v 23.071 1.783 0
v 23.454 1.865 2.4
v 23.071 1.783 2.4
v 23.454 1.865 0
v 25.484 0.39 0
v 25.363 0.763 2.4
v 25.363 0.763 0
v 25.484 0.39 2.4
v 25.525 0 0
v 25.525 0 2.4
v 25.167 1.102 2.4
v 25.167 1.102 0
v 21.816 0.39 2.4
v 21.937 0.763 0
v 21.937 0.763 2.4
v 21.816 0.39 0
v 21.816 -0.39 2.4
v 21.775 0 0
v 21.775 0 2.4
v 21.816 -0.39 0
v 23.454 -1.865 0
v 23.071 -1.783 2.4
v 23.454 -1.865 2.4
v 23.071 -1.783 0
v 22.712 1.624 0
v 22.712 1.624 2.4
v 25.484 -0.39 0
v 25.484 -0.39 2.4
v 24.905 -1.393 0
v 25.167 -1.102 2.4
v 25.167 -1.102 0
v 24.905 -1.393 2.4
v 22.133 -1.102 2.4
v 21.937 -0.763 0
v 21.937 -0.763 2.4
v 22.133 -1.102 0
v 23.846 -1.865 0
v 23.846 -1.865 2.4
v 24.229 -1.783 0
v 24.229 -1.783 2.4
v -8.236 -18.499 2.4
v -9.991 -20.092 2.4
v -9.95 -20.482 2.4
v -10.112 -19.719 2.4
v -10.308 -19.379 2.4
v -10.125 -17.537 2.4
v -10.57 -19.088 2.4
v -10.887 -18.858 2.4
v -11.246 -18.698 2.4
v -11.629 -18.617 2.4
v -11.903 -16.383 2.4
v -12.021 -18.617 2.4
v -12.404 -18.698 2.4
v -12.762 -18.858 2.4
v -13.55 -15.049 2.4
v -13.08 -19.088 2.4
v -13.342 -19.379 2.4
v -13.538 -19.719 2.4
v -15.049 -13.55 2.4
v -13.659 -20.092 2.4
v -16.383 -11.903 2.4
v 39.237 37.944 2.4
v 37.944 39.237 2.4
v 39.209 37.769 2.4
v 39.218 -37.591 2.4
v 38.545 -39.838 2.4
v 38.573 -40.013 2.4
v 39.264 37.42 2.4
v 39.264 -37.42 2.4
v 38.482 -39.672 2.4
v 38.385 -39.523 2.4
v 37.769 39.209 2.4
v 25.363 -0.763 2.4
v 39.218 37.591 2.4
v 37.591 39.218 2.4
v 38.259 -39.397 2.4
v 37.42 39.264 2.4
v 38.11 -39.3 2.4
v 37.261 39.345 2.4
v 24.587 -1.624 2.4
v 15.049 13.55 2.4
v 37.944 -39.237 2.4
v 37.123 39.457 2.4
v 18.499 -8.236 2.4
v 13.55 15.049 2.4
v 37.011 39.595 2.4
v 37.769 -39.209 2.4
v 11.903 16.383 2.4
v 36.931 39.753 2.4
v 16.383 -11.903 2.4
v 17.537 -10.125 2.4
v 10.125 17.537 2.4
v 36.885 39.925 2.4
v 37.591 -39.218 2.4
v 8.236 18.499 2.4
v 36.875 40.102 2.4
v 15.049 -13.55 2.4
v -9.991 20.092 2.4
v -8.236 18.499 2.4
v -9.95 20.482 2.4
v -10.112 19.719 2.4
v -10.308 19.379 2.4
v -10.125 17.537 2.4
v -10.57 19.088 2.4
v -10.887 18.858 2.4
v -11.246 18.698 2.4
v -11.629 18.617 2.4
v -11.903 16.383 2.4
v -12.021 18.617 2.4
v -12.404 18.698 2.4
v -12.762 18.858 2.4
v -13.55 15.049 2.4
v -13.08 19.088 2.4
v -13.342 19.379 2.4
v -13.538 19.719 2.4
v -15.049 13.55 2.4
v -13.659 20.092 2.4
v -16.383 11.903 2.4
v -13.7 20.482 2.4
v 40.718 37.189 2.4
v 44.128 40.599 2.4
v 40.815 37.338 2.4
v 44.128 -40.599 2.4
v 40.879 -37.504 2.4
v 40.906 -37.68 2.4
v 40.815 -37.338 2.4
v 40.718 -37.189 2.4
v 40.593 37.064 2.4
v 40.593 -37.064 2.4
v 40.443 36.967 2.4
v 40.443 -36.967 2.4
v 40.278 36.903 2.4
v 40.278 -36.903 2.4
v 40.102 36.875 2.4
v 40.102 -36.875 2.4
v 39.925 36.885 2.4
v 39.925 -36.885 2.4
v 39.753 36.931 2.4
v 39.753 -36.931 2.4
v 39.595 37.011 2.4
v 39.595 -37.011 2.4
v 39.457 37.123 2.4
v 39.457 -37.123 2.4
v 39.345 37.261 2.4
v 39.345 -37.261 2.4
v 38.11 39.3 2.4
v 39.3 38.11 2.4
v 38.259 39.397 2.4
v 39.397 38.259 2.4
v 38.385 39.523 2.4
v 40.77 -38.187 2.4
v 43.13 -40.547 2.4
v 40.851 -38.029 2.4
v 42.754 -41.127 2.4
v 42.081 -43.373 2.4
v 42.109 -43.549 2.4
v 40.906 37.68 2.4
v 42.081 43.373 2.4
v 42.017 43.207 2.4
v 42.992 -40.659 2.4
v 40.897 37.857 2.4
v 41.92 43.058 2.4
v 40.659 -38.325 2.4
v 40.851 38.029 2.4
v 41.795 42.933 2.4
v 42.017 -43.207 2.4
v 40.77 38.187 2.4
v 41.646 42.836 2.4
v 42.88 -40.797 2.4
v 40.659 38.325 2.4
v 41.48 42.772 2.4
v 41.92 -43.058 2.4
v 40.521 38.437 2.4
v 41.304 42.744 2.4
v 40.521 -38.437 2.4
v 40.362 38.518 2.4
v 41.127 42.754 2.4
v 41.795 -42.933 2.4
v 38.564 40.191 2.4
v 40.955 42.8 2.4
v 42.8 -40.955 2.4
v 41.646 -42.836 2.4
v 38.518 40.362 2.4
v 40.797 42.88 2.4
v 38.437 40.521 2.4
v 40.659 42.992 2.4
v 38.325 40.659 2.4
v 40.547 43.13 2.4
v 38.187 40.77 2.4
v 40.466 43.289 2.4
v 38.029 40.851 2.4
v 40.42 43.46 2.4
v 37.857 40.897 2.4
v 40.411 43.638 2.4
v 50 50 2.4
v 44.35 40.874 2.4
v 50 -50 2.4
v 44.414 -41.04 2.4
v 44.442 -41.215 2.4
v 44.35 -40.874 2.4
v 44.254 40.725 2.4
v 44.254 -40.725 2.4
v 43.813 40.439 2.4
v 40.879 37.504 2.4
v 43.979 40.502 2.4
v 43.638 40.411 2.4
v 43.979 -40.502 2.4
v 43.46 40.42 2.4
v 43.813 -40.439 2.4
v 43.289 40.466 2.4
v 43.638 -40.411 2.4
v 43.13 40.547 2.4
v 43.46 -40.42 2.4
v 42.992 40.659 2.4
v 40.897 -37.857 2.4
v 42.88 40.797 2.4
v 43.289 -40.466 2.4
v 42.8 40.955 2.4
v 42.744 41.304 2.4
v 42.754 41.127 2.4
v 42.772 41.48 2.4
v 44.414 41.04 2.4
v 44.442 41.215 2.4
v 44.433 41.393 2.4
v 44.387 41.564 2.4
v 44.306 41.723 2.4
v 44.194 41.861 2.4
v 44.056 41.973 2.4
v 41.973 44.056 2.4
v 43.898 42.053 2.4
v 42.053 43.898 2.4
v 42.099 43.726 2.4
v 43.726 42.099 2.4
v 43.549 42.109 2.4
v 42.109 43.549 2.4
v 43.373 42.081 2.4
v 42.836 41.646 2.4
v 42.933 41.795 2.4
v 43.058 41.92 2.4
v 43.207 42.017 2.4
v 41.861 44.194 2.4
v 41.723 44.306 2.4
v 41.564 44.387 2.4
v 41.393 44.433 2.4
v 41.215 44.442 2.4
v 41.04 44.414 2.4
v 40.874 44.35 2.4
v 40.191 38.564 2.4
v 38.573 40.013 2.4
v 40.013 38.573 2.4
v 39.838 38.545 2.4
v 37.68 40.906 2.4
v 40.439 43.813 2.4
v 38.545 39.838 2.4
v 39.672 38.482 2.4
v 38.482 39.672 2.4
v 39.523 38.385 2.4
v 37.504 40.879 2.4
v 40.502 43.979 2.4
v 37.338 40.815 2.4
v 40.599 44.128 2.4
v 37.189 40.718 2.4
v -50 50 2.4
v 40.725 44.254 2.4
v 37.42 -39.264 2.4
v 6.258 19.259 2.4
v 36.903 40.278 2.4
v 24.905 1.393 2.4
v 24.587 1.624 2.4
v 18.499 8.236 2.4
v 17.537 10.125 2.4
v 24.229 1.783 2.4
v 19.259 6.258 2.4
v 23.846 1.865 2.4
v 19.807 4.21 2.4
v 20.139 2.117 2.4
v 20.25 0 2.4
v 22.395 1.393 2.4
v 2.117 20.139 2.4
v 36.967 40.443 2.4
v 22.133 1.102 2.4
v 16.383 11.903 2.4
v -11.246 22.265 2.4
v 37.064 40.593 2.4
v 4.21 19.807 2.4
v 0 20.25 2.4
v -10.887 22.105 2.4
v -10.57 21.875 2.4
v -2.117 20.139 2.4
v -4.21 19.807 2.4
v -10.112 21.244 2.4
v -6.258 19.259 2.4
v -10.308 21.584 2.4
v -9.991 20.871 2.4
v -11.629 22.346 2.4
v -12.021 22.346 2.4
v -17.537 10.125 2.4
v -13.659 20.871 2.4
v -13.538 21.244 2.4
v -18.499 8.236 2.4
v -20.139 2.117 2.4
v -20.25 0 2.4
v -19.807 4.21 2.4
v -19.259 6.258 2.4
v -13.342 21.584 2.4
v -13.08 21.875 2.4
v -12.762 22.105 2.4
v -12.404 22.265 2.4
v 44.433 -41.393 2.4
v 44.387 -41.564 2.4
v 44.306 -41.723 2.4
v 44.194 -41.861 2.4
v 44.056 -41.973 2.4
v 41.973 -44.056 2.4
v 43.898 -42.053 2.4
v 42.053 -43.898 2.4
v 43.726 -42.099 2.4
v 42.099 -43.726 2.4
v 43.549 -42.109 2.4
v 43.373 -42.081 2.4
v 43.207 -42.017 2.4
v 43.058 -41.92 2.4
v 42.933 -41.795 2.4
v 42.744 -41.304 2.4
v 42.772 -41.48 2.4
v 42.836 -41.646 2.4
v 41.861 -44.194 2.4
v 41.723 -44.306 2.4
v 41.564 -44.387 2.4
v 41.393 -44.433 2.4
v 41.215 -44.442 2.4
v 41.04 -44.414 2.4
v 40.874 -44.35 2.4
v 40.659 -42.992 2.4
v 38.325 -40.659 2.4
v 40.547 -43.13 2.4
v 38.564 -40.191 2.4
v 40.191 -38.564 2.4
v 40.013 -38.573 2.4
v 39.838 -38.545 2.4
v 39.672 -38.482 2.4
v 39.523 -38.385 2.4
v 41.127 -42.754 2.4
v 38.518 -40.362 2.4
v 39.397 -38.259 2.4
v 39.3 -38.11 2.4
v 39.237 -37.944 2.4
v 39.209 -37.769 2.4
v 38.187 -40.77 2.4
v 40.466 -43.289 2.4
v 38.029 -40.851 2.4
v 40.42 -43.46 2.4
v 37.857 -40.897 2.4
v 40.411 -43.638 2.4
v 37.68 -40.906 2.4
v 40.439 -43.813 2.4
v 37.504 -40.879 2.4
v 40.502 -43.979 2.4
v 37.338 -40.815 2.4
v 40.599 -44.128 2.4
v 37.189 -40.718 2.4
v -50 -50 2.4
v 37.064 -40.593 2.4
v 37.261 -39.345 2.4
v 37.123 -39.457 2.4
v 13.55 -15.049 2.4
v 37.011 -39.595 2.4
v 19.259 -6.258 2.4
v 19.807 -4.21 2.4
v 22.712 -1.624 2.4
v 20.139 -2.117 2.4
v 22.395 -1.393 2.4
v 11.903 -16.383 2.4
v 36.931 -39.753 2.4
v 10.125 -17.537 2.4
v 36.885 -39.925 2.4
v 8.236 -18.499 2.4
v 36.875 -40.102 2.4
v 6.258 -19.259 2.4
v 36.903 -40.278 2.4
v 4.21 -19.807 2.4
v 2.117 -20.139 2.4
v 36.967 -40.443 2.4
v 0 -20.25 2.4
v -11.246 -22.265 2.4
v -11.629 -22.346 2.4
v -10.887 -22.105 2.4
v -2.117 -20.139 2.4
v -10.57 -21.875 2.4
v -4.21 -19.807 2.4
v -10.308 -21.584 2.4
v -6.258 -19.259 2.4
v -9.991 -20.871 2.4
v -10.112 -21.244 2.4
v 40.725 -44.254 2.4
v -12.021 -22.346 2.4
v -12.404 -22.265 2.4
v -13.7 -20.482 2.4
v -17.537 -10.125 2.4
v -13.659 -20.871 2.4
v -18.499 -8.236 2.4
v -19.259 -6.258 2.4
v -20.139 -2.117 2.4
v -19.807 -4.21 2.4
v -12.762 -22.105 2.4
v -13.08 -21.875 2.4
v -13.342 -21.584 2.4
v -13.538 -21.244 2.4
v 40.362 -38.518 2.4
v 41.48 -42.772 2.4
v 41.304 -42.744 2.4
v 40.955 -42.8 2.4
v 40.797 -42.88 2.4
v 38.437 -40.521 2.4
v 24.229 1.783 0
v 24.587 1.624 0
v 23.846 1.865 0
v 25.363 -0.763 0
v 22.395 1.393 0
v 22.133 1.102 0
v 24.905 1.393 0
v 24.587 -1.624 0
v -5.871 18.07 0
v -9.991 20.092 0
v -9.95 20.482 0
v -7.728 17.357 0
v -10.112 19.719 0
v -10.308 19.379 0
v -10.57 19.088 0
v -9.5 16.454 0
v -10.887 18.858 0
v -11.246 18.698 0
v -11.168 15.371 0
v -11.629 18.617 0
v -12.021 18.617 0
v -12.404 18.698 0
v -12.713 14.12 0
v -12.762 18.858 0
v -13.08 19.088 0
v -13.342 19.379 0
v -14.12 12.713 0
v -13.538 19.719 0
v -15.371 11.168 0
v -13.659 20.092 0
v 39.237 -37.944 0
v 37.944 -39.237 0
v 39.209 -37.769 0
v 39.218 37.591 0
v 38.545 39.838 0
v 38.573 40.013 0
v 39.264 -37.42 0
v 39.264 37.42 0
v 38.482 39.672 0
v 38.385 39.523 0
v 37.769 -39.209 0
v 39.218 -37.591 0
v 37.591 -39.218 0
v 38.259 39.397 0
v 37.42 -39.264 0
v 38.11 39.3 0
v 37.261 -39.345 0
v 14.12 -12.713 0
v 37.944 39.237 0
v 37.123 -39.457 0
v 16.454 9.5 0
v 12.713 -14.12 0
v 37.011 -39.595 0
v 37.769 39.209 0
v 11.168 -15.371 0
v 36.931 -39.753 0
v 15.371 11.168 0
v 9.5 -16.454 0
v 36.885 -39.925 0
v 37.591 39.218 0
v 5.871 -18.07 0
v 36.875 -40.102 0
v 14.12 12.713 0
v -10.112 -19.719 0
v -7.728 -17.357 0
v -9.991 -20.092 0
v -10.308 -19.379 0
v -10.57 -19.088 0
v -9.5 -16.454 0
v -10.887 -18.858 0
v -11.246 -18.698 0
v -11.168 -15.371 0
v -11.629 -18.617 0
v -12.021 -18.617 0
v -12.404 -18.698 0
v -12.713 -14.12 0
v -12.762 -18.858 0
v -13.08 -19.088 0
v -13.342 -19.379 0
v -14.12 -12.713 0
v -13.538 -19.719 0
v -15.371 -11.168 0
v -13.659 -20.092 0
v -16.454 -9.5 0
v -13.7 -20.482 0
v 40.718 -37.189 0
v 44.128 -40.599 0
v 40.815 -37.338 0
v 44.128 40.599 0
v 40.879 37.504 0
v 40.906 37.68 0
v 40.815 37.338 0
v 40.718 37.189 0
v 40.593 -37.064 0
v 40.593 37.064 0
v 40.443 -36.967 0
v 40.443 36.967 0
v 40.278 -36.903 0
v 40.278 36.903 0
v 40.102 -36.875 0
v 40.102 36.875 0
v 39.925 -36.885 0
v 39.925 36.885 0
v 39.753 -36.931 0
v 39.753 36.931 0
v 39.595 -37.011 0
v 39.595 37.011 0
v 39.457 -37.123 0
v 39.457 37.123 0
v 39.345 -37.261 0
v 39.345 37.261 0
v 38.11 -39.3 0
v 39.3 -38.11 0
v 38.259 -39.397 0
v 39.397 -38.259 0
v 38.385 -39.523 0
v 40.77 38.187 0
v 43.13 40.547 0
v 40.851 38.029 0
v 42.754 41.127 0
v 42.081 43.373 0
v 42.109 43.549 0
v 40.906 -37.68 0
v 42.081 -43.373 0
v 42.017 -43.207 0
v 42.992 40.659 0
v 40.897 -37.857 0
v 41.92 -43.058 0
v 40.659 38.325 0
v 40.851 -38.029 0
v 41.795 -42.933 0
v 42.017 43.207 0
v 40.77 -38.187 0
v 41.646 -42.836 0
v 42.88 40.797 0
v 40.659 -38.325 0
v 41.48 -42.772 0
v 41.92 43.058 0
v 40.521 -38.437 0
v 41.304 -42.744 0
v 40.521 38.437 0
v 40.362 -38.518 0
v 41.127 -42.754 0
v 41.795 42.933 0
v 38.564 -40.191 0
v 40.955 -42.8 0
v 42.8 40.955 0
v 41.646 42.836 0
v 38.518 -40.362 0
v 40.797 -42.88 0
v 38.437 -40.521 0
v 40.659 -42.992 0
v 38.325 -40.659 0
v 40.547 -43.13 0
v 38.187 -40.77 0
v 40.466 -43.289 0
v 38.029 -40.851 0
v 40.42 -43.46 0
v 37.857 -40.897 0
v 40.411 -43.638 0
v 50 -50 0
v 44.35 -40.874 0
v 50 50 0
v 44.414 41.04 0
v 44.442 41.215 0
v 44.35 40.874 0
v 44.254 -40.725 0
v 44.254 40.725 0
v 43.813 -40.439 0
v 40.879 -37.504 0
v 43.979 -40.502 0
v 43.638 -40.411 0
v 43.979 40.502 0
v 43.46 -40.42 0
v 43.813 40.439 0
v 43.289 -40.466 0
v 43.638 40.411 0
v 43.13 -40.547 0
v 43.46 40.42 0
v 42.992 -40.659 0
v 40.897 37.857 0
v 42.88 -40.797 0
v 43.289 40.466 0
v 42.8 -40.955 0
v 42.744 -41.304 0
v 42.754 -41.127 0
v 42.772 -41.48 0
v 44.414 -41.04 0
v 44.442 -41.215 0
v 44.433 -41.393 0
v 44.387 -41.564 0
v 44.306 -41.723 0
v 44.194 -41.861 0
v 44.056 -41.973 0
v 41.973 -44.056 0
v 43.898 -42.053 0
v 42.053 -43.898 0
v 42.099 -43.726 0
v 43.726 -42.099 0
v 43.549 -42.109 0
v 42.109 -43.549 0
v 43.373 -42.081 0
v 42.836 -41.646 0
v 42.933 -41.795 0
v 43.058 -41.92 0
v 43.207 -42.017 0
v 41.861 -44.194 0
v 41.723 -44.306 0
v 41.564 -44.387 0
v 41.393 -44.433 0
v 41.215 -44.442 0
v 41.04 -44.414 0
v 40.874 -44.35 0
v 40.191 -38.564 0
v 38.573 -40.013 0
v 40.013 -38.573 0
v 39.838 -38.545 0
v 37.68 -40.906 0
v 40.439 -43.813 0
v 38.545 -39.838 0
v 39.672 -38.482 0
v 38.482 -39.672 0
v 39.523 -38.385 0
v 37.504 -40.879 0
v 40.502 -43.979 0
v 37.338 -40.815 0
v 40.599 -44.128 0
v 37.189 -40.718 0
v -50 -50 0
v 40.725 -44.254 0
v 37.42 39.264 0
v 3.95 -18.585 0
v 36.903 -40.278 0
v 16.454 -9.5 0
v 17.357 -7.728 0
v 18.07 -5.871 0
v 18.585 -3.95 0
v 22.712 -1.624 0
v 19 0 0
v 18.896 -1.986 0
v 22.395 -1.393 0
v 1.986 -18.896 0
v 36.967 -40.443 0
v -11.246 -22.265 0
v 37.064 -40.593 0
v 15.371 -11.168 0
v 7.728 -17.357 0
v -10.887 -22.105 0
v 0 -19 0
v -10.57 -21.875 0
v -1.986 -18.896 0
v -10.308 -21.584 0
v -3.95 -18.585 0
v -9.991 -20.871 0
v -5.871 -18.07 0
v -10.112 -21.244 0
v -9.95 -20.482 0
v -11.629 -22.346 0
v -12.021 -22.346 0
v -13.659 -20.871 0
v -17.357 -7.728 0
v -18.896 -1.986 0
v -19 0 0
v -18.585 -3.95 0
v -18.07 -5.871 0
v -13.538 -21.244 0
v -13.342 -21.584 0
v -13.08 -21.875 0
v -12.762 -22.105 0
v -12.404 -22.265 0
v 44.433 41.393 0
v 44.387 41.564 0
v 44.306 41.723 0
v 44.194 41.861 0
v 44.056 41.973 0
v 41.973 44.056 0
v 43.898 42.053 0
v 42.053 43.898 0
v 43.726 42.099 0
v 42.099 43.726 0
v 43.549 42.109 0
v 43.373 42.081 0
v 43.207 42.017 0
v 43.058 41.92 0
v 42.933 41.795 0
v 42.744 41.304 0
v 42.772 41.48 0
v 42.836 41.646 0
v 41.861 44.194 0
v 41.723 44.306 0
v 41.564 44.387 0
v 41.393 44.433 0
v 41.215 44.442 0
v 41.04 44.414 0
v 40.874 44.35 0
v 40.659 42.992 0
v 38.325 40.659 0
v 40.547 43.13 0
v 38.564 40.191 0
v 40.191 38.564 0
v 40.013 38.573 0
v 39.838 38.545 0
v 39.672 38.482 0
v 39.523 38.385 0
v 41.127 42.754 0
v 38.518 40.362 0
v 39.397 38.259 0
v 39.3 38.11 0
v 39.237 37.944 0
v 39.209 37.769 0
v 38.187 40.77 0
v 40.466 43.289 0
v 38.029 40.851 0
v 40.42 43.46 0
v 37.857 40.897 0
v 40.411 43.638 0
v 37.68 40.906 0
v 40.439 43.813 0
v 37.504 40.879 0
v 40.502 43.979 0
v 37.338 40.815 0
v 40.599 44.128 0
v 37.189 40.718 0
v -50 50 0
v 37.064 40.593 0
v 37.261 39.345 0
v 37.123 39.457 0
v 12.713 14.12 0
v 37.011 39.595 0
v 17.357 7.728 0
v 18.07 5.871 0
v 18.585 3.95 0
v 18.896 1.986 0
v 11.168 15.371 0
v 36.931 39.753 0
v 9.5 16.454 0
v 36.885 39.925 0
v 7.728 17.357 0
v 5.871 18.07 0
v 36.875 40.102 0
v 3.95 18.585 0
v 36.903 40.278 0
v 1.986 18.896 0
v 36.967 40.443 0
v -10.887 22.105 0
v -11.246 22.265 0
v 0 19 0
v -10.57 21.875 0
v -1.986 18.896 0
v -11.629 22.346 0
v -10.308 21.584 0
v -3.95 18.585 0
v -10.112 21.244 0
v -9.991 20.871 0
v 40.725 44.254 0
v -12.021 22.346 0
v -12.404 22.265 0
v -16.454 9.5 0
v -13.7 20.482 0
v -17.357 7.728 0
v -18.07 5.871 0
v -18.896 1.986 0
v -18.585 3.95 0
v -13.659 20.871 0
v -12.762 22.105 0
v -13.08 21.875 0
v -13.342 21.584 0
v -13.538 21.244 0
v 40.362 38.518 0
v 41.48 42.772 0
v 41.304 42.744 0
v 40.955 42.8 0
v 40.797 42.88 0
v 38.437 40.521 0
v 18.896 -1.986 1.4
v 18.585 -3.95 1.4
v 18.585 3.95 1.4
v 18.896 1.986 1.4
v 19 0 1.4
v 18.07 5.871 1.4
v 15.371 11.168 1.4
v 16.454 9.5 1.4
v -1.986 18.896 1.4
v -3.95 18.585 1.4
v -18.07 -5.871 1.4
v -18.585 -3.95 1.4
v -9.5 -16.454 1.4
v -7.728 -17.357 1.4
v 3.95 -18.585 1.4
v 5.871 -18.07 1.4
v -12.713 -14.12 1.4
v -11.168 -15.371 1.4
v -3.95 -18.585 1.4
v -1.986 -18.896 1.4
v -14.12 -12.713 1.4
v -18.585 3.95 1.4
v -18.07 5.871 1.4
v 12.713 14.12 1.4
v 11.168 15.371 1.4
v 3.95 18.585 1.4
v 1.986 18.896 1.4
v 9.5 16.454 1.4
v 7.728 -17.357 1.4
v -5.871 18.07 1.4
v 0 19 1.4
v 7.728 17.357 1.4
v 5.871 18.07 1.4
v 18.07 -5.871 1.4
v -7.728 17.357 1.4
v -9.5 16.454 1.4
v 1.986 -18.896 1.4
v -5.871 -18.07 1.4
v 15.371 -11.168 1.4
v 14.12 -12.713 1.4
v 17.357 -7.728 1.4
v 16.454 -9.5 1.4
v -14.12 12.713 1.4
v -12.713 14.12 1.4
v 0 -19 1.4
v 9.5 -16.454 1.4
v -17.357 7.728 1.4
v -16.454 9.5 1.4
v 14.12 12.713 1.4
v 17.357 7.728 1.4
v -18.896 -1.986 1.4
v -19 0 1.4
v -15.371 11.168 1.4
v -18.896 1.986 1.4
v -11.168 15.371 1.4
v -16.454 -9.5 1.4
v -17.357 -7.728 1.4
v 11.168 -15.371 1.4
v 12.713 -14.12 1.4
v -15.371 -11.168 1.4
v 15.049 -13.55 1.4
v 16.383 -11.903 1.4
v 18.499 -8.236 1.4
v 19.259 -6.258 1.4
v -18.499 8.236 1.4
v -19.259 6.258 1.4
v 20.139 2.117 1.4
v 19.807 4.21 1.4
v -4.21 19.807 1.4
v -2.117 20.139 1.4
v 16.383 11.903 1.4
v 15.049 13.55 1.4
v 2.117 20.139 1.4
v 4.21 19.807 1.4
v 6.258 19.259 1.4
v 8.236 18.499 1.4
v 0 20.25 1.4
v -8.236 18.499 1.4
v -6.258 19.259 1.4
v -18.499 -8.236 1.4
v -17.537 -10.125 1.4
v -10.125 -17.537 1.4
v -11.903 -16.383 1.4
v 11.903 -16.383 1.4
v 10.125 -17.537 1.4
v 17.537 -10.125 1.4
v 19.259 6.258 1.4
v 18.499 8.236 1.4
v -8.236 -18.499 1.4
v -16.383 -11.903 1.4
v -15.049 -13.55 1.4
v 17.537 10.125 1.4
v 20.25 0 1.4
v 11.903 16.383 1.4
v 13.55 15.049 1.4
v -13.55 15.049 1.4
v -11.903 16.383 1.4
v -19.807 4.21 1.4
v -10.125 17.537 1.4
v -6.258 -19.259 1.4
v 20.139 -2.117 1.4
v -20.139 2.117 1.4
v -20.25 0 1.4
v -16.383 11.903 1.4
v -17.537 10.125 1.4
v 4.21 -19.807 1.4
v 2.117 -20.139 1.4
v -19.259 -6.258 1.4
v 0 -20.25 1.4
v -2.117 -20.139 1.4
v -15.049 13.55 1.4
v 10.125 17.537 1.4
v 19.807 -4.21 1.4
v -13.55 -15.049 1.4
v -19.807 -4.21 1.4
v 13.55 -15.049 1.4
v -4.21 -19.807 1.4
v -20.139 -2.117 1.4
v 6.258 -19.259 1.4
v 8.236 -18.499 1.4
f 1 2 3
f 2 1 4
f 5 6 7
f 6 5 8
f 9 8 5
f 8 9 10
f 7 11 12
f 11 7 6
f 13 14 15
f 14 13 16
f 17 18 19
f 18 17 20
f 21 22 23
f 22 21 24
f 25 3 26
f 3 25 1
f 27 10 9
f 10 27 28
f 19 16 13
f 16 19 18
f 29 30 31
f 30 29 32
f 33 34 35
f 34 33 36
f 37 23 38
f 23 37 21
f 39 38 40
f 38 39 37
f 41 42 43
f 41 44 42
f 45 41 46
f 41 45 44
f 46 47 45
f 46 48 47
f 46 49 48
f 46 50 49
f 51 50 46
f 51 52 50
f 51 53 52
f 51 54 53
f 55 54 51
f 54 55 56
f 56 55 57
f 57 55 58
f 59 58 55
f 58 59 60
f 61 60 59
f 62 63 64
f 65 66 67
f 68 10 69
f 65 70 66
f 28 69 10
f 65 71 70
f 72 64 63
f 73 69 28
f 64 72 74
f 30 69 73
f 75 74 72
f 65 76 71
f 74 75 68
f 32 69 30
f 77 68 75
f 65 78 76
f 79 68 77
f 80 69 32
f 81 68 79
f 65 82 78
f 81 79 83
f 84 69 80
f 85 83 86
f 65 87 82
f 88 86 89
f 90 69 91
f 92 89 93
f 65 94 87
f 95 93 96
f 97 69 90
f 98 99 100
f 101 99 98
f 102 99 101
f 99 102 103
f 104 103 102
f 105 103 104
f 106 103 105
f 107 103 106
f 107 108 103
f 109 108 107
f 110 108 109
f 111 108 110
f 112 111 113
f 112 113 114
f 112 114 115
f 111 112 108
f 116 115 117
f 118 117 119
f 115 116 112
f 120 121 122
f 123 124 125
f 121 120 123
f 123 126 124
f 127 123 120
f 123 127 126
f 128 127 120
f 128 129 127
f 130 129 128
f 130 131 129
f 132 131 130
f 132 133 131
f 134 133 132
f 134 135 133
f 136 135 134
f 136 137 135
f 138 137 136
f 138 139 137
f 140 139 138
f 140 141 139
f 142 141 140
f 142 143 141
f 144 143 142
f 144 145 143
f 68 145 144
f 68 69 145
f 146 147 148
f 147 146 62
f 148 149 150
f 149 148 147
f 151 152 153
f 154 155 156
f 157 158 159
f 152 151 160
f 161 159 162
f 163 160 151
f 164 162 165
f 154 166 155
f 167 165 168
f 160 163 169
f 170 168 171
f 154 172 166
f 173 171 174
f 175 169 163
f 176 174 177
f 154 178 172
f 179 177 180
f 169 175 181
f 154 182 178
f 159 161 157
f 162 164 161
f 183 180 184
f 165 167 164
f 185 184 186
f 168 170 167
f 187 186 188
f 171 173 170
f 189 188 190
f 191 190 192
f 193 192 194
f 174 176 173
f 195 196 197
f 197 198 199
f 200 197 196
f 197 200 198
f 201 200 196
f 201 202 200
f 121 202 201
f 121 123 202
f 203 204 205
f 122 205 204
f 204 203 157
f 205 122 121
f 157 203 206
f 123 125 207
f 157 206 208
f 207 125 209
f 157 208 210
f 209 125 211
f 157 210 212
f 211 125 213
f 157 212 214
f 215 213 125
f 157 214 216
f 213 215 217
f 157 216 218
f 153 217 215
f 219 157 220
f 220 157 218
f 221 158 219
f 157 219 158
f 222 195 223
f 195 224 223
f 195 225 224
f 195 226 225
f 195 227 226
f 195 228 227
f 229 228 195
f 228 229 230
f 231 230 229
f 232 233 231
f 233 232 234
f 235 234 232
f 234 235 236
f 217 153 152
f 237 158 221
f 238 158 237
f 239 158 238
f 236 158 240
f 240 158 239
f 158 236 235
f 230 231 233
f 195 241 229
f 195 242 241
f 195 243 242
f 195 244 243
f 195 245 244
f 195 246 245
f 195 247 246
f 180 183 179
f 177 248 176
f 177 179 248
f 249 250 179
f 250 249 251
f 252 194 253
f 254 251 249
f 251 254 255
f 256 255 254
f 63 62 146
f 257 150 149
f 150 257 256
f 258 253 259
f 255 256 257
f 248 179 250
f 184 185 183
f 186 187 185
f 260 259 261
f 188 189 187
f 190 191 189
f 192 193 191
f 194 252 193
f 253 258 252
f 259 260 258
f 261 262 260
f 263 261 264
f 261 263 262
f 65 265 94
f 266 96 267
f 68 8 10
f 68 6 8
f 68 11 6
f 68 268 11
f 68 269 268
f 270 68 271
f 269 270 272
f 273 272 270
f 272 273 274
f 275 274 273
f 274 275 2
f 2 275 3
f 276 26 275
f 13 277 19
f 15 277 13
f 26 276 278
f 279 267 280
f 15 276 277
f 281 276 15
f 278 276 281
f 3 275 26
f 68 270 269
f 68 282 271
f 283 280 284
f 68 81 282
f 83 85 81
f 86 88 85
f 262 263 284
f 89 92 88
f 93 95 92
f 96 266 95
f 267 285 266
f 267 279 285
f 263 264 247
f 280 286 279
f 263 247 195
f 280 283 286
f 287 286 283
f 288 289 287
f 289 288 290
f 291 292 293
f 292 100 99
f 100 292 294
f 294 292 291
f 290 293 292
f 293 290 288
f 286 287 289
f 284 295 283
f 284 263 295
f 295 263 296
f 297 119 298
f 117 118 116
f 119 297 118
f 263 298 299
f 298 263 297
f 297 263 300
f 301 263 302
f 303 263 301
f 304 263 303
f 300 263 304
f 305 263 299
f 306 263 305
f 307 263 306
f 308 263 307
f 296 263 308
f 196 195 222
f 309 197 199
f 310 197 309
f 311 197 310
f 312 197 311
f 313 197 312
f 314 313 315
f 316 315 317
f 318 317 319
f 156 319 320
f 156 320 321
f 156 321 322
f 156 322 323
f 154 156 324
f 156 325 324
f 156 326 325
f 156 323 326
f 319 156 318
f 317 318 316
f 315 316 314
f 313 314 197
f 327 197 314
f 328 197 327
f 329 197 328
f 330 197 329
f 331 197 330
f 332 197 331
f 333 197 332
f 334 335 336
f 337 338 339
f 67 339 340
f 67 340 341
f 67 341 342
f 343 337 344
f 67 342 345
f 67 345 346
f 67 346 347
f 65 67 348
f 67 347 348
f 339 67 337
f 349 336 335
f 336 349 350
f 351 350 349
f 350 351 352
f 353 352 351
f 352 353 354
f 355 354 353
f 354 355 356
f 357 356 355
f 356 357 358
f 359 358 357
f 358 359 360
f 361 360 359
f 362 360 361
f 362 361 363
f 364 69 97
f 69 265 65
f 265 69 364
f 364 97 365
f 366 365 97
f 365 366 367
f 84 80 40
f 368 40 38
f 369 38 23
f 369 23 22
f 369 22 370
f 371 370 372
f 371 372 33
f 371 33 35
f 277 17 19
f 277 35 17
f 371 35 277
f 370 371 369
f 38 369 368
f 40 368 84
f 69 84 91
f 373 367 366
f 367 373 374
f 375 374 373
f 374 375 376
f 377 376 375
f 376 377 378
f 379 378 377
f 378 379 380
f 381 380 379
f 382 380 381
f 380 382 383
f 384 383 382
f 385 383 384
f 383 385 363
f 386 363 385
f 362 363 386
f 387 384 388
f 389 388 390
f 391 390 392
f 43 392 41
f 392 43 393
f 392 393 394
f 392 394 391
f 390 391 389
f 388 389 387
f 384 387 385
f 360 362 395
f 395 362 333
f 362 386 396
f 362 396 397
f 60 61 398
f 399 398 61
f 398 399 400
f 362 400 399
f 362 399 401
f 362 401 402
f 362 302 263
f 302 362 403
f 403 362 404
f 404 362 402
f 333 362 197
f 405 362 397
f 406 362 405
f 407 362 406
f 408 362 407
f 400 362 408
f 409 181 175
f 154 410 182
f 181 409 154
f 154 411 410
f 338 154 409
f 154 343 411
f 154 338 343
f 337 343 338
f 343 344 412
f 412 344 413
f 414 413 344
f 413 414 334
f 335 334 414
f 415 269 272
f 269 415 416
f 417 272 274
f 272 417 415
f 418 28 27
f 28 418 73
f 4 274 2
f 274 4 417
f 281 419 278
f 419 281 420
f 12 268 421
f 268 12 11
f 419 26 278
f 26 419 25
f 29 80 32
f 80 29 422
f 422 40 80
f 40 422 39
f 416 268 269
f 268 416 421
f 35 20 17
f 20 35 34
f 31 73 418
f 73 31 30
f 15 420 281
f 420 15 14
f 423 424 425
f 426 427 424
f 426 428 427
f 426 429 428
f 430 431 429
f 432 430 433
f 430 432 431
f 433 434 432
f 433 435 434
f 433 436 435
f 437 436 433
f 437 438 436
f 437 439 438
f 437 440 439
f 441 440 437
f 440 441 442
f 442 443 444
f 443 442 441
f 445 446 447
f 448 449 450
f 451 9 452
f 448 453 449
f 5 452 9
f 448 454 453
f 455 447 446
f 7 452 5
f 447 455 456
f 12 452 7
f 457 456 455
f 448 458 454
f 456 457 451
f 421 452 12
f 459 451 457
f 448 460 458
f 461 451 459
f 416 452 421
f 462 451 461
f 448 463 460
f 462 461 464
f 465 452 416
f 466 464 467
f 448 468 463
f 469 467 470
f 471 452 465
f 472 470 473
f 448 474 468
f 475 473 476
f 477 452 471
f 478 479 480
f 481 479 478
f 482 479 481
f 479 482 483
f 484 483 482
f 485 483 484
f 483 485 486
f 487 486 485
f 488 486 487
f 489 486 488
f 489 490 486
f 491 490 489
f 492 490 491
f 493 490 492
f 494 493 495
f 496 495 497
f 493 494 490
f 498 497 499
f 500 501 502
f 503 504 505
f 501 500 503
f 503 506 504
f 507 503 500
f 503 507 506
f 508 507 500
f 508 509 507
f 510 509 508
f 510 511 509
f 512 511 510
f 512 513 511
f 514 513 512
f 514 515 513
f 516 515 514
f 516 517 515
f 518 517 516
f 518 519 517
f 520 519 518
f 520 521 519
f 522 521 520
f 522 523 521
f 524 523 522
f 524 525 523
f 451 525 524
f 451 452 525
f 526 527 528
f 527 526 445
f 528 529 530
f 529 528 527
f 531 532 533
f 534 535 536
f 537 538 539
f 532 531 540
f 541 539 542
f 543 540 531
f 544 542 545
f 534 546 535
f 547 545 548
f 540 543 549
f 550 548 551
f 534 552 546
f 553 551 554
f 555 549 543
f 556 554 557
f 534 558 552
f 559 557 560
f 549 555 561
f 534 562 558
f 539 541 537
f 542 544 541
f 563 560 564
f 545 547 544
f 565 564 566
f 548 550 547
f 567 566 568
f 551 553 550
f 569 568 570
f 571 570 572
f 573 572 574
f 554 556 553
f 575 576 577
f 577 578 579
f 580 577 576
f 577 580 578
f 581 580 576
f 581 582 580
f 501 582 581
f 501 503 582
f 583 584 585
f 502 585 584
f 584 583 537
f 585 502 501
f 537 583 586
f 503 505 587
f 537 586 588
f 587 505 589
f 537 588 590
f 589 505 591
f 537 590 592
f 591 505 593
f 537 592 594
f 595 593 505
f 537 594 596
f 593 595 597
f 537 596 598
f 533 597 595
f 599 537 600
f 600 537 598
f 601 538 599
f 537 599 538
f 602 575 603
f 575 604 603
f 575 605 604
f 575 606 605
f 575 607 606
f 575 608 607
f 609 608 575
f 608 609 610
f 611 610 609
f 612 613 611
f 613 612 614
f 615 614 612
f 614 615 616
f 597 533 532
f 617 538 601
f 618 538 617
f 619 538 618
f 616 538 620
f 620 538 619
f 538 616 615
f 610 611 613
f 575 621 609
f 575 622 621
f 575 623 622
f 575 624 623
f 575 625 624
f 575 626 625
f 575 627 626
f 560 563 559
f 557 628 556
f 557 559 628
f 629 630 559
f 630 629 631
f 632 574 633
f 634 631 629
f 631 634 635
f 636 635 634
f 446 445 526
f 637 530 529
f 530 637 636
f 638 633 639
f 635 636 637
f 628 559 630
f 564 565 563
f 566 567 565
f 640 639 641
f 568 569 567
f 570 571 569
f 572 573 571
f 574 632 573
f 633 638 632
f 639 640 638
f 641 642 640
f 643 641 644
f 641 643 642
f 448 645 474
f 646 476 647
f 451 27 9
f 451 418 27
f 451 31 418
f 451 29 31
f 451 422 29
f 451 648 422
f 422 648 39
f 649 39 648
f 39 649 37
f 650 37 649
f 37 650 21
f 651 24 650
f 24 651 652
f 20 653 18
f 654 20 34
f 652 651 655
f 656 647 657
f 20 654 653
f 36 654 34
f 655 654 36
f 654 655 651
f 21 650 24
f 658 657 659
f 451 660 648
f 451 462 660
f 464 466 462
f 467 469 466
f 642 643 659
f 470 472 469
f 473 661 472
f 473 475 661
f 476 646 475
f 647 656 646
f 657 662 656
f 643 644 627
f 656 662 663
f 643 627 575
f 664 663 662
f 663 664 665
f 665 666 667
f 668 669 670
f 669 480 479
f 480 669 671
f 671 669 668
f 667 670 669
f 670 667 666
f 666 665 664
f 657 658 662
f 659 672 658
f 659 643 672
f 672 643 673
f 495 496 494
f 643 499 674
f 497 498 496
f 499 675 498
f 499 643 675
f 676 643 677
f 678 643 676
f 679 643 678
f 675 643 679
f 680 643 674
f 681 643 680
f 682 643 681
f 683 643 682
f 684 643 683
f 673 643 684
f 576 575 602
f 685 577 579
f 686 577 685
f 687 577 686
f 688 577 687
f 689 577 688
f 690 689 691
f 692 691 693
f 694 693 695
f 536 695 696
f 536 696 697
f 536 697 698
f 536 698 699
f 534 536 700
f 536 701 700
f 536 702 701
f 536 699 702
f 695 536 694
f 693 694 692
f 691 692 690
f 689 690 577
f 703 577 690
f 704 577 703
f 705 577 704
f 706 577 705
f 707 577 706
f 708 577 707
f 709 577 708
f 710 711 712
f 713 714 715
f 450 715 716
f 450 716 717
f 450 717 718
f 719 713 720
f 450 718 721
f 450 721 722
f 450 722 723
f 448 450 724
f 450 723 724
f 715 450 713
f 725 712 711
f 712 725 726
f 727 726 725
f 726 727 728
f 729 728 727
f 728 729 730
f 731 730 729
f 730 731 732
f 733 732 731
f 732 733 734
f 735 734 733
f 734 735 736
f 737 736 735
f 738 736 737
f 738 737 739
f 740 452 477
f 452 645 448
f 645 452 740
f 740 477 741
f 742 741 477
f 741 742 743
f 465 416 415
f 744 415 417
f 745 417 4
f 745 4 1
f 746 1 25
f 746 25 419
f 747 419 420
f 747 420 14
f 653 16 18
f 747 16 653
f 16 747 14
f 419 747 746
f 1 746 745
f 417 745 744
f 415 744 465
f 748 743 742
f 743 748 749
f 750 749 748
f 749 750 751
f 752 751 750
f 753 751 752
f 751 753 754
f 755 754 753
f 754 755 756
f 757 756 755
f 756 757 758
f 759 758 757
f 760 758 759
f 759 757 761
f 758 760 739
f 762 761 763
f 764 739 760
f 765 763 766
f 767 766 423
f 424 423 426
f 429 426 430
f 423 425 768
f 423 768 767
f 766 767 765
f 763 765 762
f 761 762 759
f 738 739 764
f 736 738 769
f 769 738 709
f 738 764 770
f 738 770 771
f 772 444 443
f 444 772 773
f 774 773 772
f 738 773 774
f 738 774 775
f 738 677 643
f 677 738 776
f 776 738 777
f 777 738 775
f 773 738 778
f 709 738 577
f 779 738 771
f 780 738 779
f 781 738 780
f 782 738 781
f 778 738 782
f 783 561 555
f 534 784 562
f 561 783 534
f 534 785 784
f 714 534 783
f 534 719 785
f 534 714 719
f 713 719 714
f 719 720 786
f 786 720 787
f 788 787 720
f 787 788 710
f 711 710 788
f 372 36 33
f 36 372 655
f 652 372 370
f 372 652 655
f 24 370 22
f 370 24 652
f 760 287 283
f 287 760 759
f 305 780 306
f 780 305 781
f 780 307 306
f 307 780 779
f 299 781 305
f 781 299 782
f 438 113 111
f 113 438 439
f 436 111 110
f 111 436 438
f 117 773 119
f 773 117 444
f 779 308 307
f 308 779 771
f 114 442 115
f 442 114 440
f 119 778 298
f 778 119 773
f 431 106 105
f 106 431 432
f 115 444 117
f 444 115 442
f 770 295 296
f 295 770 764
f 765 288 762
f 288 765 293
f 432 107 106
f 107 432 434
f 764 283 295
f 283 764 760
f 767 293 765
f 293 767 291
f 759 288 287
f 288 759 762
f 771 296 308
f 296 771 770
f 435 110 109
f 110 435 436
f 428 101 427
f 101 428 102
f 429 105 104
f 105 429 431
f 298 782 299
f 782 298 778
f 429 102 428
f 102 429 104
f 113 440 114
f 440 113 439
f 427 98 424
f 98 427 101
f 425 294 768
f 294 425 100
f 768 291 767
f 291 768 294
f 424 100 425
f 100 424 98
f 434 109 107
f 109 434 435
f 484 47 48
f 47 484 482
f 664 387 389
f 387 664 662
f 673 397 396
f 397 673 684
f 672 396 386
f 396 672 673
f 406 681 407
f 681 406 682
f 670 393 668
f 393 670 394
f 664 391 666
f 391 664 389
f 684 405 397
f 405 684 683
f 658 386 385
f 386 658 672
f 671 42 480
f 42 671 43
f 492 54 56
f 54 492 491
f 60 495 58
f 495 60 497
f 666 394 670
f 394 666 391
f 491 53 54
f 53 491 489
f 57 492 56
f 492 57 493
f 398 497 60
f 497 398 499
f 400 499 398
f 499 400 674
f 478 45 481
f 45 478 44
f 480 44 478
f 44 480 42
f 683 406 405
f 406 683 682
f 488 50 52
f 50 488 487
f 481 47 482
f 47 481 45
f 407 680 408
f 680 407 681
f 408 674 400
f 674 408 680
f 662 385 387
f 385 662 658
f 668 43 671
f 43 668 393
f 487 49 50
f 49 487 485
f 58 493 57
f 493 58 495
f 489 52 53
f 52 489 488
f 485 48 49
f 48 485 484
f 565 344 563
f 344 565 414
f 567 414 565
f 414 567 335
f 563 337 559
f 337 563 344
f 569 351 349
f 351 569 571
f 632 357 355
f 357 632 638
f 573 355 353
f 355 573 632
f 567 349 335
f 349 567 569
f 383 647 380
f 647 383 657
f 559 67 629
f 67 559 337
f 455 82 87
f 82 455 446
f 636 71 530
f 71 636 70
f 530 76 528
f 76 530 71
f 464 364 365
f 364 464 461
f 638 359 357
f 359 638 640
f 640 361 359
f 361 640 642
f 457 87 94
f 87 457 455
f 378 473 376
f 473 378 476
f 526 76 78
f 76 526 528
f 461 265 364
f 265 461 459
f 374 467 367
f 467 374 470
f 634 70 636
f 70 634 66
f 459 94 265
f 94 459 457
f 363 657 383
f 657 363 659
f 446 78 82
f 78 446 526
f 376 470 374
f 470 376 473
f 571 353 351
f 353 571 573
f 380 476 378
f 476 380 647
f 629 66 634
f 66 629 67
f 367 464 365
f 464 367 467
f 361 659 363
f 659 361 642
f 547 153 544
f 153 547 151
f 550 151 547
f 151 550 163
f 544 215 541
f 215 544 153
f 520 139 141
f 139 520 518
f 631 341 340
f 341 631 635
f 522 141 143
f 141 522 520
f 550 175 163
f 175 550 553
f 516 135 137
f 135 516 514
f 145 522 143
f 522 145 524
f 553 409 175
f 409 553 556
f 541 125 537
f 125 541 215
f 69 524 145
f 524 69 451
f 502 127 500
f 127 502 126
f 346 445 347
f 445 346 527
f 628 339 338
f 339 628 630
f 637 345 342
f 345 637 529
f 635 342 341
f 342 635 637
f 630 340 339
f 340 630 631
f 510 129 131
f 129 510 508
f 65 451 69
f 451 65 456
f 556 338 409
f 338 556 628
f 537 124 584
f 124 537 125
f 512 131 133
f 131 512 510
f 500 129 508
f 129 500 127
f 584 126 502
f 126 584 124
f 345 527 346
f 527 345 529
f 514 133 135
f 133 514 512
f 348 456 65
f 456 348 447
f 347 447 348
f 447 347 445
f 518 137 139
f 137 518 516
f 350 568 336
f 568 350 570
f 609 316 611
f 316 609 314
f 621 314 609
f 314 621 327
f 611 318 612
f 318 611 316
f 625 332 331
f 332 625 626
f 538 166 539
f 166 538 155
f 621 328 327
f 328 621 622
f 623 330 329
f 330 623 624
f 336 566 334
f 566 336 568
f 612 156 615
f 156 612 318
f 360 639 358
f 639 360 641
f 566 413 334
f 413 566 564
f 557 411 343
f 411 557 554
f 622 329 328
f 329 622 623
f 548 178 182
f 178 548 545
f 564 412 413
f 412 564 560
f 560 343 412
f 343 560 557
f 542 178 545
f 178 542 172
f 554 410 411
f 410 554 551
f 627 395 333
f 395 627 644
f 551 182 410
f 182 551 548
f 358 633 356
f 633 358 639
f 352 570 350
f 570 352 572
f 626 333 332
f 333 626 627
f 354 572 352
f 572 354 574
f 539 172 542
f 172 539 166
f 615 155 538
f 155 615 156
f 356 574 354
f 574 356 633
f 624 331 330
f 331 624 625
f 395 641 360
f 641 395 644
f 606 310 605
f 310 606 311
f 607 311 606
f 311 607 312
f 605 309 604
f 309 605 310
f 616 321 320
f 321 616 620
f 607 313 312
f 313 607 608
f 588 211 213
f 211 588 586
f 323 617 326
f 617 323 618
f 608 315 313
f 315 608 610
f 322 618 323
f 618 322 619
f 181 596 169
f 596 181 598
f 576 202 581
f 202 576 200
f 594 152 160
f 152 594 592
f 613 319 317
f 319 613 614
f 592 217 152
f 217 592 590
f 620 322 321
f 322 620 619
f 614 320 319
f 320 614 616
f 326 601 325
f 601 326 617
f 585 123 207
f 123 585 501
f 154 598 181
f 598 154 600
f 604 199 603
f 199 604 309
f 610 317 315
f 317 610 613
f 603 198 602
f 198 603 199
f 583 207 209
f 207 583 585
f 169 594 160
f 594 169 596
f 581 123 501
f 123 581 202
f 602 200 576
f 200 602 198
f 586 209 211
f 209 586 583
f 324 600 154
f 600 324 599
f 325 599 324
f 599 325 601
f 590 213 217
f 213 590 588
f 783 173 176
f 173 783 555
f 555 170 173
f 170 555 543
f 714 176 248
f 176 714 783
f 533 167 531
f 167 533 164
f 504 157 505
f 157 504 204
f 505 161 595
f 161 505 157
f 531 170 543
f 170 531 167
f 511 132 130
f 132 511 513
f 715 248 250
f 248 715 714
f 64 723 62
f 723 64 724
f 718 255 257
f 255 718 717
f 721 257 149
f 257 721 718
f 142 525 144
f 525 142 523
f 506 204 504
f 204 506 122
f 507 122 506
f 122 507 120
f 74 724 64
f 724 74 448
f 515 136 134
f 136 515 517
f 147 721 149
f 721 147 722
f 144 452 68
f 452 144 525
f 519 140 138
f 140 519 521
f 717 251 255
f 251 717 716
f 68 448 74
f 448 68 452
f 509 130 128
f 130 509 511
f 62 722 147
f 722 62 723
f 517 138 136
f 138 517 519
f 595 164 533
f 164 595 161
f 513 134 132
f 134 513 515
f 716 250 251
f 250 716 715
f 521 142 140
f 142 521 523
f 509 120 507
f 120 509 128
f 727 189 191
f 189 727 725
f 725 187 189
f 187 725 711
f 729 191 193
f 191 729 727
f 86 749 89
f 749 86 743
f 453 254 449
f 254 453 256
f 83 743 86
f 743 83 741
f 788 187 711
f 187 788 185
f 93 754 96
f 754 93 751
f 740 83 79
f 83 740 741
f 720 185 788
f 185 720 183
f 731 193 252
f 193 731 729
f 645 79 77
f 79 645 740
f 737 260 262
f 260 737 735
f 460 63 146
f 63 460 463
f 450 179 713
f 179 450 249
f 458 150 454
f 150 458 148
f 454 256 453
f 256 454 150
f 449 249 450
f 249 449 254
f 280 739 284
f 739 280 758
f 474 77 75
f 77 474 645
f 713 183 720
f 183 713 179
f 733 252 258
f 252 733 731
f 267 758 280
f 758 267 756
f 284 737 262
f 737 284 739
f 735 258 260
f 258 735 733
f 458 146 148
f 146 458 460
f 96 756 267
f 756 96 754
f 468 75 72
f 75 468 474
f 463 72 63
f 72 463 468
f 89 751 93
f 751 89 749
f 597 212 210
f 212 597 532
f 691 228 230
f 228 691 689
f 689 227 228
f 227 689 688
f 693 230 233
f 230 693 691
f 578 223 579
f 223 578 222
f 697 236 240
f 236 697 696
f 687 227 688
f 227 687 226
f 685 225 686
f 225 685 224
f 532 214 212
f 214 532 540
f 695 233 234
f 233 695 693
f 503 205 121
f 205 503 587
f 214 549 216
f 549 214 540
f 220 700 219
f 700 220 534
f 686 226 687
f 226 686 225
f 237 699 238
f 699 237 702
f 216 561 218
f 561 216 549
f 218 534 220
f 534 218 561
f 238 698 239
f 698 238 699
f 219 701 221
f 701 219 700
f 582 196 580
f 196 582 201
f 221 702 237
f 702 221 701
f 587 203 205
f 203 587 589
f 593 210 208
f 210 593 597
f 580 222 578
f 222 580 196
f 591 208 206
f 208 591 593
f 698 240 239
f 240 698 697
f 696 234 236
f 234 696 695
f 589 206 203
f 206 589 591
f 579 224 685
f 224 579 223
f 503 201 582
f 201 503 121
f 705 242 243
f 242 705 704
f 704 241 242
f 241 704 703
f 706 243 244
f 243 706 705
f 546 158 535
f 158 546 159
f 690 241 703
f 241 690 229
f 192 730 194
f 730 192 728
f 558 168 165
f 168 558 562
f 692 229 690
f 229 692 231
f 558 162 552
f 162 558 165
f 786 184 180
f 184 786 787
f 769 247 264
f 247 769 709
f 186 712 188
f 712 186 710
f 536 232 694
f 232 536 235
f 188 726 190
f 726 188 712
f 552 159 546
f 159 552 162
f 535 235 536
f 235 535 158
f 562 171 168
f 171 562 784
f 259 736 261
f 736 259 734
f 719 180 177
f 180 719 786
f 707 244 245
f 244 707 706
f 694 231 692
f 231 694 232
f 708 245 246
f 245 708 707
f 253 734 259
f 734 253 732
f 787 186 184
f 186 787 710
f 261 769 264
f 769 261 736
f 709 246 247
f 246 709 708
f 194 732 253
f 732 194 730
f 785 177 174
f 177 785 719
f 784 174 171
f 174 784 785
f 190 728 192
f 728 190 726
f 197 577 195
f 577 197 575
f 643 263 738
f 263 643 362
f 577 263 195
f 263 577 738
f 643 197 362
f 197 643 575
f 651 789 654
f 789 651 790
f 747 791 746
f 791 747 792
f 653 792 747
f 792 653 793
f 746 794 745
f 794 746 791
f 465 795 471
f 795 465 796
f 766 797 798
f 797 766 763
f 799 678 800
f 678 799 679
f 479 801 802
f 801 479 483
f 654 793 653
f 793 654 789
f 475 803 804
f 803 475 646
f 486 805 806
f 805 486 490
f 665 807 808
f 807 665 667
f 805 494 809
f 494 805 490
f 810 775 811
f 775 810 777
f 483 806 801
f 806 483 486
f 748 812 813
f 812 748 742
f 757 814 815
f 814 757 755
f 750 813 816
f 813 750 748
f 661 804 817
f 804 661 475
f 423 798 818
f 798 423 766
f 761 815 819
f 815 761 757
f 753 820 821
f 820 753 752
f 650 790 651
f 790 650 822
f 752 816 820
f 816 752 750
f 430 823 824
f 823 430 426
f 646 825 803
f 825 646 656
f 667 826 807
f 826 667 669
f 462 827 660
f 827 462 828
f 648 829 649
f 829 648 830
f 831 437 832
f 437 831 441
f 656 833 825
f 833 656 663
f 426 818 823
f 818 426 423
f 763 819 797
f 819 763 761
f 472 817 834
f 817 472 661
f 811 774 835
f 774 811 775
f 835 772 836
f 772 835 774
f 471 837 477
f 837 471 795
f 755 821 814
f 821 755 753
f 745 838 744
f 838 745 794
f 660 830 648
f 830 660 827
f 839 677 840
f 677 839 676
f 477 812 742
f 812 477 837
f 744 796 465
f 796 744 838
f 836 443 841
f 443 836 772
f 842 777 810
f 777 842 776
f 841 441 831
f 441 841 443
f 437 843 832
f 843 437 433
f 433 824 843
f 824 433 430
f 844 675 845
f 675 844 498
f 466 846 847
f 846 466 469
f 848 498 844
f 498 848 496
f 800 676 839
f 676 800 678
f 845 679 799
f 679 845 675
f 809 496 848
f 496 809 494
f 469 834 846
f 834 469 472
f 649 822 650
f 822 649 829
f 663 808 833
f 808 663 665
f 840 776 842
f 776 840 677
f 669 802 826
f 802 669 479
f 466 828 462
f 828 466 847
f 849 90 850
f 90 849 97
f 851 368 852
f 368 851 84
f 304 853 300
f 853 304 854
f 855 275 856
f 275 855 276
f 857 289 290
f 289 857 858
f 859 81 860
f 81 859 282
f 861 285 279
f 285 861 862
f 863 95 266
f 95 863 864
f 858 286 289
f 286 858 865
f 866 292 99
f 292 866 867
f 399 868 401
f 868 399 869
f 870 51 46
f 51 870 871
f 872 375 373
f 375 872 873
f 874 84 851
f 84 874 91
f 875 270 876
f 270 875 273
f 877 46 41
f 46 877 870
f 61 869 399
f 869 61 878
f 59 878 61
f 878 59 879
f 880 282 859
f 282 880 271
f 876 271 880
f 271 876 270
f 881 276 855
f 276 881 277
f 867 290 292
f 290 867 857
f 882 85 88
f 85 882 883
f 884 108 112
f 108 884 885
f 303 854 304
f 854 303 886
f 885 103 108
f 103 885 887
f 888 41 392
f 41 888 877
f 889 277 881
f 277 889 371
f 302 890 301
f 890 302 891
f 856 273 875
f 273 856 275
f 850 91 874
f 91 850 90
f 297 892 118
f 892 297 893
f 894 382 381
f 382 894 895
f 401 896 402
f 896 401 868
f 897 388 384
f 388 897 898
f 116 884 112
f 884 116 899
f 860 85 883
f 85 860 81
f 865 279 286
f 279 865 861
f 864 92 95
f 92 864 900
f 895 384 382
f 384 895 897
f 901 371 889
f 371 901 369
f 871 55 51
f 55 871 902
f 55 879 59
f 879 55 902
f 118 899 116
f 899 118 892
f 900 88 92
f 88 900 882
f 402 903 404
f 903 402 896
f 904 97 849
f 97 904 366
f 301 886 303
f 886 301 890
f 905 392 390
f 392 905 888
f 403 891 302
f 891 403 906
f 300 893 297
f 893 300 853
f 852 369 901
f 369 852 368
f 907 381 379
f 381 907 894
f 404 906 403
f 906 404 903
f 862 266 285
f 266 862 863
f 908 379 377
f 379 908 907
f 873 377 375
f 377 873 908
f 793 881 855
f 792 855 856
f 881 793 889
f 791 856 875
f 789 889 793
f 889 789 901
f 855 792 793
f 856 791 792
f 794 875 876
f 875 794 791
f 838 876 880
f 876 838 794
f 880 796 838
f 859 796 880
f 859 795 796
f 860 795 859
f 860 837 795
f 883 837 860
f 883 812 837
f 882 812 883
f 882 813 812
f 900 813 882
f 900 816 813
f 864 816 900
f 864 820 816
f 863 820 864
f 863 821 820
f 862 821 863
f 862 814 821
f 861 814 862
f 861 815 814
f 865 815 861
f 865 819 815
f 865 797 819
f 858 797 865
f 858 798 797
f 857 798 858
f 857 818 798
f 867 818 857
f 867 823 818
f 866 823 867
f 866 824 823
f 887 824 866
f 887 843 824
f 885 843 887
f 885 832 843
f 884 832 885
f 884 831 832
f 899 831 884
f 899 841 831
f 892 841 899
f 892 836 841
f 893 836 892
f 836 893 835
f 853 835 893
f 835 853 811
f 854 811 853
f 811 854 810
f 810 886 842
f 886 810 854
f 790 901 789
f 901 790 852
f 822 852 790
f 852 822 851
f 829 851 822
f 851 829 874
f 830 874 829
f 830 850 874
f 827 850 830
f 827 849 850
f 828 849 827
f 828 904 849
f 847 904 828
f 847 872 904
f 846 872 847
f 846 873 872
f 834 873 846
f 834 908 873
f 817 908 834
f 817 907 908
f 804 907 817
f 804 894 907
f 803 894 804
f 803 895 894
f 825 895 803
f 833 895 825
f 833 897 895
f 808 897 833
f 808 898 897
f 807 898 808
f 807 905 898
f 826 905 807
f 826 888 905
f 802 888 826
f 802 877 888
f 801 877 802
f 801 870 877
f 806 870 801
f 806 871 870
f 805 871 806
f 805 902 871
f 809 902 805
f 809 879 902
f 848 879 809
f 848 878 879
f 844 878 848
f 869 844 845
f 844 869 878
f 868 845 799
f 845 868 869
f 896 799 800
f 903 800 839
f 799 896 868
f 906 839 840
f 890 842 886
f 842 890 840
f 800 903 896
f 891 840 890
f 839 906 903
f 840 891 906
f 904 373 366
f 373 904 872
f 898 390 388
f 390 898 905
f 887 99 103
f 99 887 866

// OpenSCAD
/*
Design by Joe Iddon.
*/

$fn = 30;
width = 100;
thickness = 2.4;
motor_ring_thickness = 1;
motor_ring_diameter = 40.5;
motor_diameter = 38;
screw_hole_diameter = 3.75;
screw_hole_dist = 23.65;
ldr_hole_diameter = 1.7;
ldr_hole_width = 3.3;
ldr_hole_length = 5;
ldr_hole_dist = 55;

difference(){
    translate([0,0,thickness/2])
    cube([width,width,thickness],center=true);
    cylinder(d=motor_diameter,h=thickness,$fn=60);
    translate([0,0,thickness-motor_ring_thickness])
    cylinder(d=motor_ring_diameter,h=motor_ring_thickness,$fn=60);
    for (angle = [0,120,240]){
        rotate(angle)
        translate([screw_hole_dist, 0, 0])
        cylinder(d=screw_hole_diameter,h=thickness);
    }
    for (angle = [-45, 45]){
        rotate(angle)
        translate([ldr_hole_dist, 0, 0])
        ldr_holes();
    }
}

module ldr_holes(){
    translate([0,-ldr_hole_width/2,0])
    cylinder(d=ldr_hole_diameter,h=thickness);
    translate([0, ldr_hole_width/2,0])
    cylinder(d=ldr_hole_diameter,h=thickness);
    translate([ldr_hole_length,-ldr_hole_width/2,0])
    cylinder(d=ldr_hole_diameter,h=thickness);
    translate([ldr_hole_length, ldr_hole_width/2,0])
    cylinder(d=ldr_hole_diameter,h=thickness);
}
